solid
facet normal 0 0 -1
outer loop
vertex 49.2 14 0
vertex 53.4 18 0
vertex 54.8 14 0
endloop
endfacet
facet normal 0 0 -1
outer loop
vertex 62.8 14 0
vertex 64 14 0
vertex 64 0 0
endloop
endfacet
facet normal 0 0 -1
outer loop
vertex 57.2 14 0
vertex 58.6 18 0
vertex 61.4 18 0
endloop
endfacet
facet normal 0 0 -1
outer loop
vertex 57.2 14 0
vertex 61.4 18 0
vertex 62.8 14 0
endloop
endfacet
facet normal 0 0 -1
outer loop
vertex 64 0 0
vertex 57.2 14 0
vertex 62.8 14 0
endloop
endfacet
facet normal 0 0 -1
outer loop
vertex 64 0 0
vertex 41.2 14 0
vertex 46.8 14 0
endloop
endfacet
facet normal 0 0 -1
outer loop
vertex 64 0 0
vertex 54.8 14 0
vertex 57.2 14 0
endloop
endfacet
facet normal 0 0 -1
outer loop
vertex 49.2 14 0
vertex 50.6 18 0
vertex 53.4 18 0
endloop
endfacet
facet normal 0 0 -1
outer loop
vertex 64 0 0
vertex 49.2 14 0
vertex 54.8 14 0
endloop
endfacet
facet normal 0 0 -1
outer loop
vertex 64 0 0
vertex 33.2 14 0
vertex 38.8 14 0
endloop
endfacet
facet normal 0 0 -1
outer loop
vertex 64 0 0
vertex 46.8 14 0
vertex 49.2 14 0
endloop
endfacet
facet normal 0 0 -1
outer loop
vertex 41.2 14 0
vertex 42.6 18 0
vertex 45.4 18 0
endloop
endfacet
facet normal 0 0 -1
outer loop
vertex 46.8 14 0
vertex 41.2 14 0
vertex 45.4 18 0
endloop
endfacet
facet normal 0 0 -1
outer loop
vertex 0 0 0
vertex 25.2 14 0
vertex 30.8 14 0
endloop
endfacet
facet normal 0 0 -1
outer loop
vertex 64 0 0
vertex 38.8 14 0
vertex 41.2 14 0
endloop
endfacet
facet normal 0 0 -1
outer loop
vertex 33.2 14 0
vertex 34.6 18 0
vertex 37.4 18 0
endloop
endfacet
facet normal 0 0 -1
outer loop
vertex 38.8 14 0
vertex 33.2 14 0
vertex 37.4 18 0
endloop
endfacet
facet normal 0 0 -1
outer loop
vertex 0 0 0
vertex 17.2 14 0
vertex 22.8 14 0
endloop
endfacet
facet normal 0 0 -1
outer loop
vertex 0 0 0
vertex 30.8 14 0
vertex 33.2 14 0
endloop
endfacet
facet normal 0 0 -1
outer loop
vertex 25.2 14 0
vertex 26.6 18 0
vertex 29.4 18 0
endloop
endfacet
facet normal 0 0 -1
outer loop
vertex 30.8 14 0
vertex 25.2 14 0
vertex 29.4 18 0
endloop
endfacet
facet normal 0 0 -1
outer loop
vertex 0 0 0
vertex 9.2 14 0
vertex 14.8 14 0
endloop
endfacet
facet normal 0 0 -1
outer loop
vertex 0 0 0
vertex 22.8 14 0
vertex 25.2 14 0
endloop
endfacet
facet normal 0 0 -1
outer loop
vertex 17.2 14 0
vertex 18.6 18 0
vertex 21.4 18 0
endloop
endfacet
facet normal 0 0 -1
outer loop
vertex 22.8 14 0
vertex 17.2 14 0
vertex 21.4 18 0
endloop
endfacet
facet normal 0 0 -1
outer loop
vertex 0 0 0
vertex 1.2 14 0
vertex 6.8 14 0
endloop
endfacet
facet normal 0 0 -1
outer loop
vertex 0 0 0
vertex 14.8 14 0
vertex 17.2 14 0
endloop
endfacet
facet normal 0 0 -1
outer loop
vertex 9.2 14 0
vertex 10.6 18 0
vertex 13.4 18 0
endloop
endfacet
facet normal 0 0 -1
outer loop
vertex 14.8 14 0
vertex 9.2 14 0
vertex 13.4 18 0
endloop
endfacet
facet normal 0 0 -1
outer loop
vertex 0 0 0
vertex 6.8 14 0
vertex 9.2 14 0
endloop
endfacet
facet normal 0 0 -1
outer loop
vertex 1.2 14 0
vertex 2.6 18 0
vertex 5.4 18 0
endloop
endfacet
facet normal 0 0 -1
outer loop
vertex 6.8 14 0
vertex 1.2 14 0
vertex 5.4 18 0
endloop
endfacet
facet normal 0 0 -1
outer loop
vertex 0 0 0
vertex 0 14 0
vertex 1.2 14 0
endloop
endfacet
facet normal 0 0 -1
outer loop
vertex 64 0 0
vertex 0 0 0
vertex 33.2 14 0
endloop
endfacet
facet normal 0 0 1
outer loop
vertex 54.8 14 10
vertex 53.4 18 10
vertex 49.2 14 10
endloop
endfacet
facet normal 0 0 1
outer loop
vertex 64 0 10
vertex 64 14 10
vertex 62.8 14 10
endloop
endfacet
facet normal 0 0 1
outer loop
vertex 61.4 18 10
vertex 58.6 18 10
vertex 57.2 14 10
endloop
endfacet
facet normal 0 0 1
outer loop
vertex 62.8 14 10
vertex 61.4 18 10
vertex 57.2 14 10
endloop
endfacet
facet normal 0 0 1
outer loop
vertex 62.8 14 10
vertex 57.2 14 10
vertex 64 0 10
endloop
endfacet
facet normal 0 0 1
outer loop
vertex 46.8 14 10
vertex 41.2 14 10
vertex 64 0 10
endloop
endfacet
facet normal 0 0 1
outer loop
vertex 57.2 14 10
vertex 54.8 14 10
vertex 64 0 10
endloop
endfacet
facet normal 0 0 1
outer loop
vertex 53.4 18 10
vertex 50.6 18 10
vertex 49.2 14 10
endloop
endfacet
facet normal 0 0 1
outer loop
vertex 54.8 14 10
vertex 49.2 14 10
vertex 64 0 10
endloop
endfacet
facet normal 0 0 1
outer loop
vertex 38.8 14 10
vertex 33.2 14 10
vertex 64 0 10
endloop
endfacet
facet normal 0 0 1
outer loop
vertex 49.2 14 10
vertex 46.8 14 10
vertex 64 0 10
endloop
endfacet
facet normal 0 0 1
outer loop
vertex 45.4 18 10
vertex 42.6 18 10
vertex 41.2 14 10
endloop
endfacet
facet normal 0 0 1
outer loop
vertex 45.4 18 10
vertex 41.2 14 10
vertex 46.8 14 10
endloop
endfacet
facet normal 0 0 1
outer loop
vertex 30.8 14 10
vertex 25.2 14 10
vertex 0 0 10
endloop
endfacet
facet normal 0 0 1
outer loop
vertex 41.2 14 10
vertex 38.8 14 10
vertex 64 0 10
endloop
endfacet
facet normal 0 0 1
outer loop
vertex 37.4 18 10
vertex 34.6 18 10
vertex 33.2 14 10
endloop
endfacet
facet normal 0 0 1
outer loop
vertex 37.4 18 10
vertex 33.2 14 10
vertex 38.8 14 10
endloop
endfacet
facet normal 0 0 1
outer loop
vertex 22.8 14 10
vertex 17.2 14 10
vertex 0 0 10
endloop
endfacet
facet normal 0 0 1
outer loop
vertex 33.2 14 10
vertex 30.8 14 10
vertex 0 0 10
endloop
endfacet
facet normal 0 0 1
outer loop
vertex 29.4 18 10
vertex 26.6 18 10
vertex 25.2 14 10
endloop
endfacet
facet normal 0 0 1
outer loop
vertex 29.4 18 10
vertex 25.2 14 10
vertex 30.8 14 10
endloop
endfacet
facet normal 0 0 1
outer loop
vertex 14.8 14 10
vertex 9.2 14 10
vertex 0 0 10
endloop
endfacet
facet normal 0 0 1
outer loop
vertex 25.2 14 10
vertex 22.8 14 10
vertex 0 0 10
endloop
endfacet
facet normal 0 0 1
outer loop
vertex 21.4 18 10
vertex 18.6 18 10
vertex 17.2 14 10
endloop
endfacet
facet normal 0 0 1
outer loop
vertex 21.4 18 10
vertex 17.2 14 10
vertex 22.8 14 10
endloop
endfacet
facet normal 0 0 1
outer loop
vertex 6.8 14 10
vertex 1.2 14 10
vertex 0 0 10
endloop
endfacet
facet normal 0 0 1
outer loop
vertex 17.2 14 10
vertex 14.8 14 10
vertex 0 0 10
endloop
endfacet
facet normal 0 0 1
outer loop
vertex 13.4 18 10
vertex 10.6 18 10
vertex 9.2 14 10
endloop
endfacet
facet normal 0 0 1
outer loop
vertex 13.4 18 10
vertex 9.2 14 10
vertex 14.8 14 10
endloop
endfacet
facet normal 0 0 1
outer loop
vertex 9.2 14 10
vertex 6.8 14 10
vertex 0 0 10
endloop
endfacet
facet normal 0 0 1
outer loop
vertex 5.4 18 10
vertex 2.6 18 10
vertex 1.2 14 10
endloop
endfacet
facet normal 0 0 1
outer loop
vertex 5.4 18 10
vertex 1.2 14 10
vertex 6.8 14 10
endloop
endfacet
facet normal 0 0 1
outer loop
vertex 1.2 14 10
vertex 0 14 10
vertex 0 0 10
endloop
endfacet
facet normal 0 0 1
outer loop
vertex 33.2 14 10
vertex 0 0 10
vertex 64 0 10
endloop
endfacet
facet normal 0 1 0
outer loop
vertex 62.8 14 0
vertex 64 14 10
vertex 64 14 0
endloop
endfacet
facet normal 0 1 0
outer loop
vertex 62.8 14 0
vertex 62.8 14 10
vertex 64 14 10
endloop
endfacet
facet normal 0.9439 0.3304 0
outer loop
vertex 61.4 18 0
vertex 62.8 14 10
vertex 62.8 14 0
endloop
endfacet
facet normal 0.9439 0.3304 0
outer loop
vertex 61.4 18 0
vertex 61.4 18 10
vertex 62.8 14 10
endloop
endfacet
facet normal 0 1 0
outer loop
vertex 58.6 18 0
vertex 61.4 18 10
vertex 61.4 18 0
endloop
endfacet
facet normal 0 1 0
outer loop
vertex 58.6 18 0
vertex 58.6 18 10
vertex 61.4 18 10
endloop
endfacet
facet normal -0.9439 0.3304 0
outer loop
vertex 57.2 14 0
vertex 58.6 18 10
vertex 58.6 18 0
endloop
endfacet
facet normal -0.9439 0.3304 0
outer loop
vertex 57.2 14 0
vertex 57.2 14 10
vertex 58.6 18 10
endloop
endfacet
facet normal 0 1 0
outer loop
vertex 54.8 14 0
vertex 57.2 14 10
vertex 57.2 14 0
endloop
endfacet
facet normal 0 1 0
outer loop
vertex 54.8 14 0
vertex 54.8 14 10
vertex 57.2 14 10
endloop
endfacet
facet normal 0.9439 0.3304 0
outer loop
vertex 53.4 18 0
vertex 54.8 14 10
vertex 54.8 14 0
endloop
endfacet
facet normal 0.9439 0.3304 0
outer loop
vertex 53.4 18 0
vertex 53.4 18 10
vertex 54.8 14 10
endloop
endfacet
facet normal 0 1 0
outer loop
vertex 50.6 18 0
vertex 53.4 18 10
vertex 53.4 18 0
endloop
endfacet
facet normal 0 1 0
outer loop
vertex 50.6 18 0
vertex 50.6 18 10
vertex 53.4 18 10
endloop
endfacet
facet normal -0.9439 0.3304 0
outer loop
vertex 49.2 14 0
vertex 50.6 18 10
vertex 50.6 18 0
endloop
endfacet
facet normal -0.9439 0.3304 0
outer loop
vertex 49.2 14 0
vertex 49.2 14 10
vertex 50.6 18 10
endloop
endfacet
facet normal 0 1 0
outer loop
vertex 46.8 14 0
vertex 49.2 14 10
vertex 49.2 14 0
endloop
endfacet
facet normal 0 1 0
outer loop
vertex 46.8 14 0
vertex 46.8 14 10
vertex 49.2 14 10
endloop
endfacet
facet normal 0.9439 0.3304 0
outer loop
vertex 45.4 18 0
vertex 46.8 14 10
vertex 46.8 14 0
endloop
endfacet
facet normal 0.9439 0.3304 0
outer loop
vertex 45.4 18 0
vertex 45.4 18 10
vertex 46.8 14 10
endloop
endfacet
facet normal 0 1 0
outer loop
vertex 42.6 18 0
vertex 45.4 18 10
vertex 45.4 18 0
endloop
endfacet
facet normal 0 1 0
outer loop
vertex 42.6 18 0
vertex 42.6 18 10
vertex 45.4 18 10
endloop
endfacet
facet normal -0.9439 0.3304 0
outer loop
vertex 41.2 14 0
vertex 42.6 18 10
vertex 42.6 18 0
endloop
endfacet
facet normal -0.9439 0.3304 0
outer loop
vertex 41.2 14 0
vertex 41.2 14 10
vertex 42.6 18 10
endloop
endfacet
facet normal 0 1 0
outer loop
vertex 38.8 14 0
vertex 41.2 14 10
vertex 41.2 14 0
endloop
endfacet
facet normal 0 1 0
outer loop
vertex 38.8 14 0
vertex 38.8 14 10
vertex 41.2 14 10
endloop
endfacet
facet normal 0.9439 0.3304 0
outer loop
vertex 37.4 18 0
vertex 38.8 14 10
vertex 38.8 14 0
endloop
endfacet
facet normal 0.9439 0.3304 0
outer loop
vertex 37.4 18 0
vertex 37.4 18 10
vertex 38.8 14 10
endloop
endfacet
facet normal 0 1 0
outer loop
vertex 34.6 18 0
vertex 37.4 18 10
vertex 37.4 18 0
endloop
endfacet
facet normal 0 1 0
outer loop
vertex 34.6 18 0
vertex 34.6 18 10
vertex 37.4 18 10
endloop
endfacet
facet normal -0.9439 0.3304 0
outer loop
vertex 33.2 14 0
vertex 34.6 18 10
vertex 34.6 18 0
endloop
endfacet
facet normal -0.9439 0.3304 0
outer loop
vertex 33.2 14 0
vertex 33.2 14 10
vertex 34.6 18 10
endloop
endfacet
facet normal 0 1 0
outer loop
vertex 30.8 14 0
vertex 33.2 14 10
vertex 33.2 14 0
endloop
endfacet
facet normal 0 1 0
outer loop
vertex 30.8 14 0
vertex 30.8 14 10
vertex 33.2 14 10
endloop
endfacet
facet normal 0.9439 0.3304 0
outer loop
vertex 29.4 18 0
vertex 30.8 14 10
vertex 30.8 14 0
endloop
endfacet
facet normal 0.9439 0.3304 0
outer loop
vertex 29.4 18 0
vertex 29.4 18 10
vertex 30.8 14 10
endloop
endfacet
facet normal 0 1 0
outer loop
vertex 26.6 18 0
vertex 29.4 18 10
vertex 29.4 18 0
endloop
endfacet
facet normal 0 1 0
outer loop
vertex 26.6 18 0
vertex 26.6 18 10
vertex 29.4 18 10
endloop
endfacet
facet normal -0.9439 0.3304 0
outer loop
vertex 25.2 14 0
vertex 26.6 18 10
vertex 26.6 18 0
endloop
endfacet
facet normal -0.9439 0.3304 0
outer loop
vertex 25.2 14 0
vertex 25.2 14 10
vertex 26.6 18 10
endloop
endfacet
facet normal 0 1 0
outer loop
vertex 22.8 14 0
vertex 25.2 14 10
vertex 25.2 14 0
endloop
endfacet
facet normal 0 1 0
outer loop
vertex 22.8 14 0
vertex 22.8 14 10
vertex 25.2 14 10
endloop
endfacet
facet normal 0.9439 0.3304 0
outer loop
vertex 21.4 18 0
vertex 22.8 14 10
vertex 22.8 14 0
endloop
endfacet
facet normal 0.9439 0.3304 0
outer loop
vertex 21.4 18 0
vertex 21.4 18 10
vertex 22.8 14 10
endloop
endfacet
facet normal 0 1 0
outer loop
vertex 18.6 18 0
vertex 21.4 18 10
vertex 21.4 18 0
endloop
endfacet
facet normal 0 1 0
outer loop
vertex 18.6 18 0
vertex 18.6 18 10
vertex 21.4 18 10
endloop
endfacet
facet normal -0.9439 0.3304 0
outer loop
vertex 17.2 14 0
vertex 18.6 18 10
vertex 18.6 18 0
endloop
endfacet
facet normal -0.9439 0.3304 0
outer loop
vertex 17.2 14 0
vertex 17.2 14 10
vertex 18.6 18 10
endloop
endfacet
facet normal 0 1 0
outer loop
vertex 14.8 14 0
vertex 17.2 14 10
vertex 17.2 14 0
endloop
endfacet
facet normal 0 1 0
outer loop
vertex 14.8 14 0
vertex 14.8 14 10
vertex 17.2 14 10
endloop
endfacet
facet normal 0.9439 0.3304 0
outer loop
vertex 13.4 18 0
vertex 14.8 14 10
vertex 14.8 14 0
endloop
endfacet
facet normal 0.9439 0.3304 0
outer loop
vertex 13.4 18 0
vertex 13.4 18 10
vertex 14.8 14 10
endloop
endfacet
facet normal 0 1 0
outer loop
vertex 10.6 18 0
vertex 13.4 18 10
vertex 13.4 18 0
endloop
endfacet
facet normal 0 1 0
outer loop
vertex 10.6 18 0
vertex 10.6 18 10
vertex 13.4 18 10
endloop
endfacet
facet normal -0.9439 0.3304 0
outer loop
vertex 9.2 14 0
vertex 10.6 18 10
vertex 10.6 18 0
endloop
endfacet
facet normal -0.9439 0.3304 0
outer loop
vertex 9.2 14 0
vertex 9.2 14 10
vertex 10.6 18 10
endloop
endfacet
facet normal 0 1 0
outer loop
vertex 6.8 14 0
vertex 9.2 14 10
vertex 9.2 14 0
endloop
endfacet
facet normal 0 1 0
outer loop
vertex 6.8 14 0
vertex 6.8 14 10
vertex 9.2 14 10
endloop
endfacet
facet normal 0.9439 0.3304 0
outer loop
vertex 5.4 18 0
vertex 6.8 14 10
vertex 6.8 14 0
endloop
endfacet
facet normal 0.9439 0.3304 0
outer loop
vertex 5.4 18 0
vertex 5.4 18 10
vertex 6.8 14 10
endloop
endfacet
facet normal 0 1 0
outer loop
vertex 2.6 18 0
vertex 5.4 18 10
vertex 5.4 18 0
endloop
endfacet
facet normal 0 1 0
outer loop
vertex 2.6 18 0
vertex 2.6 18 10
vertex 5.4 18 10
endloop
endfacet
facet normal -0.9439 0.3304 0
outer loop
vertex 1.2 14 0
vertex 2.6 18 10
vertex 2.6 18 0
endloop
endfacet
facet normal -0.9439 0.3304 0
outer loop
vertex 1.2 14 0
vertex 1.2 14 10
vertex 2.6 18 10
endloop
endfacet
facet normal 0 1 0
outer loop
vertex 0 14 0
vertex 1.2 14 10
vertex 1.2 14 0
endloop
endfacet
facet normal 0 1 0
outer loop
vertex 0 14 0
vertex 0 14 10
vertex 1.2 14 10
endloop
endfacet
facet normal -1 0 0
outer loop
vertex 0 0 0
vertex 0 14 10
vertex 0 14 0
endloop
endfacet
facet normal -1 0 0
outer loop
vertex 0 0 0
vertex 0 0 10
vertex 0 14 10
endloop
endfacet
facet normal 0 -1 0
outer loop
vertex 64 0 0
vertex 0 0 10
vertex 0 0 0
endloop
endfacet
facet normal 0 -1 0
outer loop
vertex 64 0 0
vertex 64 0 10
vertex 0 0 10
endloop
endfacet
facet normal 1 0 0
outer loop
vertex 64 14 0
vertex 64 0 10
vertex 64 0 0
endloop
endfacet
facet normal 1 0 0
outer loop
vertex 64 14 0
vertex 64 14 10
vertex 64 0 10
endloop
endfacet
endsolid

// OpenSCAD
$fn = 32;

// ----------------------------------------------------------------------
// Gear rack: 8 teeth, pitch 8 mm
// ----------------------------------------------------------------------

// --- parameters (mm) ---
teeth = 8;                // number of teeth
pitch = 8;                // tooth pitch, X
root_w = 5.6;             // tooth width at the root
tip_w = 2.8;              // tooth width at the tip
base_h = 14;              // rack body height, Y
tooth_h = 4;              // tooth height above the body
plate_t = 10;             // rack width, Z (extrusion height)
fit_tol = 0.1;            // declared fit tolerance (prompt contract)
free_tol = 0.3;           // declared free tolerance (prompt contract)

rack_l = teeth * pitch;  // overall length
total_h = base_h + tooth_h;  // overall height

profile = [[0, 0], [64, 0], [64, 14], [62.8, 14], [61.4, 18], [58.6, 18], [57.2, 14], [54.8, 14], [53.4, 18], [50.6, 18], [49.2, 14], [46.8, 14], [45.4, 18], [42.6, 18], [41.2, 14], [38.8, 14], [37.4, 18], [34.6, 18], [33.2, 14], [30.8, 14], [29.4, 18], [26.6, 18], [25.2, 14], [22.8, 14], [21.4, 18], [18.6, 18], [17.2, 14], [14.8, 14], [13.4, 18], [10.6, 18], [9.2, 14], [6.8, 14], [5.4, 18], [2.6, 18], [1.2, 14], [0, 14]];  // primary outline, 36 points, counter clockwise

// --- the one profile operation ---
linear_extrude(height = plate_t) polygon(points = profile);
